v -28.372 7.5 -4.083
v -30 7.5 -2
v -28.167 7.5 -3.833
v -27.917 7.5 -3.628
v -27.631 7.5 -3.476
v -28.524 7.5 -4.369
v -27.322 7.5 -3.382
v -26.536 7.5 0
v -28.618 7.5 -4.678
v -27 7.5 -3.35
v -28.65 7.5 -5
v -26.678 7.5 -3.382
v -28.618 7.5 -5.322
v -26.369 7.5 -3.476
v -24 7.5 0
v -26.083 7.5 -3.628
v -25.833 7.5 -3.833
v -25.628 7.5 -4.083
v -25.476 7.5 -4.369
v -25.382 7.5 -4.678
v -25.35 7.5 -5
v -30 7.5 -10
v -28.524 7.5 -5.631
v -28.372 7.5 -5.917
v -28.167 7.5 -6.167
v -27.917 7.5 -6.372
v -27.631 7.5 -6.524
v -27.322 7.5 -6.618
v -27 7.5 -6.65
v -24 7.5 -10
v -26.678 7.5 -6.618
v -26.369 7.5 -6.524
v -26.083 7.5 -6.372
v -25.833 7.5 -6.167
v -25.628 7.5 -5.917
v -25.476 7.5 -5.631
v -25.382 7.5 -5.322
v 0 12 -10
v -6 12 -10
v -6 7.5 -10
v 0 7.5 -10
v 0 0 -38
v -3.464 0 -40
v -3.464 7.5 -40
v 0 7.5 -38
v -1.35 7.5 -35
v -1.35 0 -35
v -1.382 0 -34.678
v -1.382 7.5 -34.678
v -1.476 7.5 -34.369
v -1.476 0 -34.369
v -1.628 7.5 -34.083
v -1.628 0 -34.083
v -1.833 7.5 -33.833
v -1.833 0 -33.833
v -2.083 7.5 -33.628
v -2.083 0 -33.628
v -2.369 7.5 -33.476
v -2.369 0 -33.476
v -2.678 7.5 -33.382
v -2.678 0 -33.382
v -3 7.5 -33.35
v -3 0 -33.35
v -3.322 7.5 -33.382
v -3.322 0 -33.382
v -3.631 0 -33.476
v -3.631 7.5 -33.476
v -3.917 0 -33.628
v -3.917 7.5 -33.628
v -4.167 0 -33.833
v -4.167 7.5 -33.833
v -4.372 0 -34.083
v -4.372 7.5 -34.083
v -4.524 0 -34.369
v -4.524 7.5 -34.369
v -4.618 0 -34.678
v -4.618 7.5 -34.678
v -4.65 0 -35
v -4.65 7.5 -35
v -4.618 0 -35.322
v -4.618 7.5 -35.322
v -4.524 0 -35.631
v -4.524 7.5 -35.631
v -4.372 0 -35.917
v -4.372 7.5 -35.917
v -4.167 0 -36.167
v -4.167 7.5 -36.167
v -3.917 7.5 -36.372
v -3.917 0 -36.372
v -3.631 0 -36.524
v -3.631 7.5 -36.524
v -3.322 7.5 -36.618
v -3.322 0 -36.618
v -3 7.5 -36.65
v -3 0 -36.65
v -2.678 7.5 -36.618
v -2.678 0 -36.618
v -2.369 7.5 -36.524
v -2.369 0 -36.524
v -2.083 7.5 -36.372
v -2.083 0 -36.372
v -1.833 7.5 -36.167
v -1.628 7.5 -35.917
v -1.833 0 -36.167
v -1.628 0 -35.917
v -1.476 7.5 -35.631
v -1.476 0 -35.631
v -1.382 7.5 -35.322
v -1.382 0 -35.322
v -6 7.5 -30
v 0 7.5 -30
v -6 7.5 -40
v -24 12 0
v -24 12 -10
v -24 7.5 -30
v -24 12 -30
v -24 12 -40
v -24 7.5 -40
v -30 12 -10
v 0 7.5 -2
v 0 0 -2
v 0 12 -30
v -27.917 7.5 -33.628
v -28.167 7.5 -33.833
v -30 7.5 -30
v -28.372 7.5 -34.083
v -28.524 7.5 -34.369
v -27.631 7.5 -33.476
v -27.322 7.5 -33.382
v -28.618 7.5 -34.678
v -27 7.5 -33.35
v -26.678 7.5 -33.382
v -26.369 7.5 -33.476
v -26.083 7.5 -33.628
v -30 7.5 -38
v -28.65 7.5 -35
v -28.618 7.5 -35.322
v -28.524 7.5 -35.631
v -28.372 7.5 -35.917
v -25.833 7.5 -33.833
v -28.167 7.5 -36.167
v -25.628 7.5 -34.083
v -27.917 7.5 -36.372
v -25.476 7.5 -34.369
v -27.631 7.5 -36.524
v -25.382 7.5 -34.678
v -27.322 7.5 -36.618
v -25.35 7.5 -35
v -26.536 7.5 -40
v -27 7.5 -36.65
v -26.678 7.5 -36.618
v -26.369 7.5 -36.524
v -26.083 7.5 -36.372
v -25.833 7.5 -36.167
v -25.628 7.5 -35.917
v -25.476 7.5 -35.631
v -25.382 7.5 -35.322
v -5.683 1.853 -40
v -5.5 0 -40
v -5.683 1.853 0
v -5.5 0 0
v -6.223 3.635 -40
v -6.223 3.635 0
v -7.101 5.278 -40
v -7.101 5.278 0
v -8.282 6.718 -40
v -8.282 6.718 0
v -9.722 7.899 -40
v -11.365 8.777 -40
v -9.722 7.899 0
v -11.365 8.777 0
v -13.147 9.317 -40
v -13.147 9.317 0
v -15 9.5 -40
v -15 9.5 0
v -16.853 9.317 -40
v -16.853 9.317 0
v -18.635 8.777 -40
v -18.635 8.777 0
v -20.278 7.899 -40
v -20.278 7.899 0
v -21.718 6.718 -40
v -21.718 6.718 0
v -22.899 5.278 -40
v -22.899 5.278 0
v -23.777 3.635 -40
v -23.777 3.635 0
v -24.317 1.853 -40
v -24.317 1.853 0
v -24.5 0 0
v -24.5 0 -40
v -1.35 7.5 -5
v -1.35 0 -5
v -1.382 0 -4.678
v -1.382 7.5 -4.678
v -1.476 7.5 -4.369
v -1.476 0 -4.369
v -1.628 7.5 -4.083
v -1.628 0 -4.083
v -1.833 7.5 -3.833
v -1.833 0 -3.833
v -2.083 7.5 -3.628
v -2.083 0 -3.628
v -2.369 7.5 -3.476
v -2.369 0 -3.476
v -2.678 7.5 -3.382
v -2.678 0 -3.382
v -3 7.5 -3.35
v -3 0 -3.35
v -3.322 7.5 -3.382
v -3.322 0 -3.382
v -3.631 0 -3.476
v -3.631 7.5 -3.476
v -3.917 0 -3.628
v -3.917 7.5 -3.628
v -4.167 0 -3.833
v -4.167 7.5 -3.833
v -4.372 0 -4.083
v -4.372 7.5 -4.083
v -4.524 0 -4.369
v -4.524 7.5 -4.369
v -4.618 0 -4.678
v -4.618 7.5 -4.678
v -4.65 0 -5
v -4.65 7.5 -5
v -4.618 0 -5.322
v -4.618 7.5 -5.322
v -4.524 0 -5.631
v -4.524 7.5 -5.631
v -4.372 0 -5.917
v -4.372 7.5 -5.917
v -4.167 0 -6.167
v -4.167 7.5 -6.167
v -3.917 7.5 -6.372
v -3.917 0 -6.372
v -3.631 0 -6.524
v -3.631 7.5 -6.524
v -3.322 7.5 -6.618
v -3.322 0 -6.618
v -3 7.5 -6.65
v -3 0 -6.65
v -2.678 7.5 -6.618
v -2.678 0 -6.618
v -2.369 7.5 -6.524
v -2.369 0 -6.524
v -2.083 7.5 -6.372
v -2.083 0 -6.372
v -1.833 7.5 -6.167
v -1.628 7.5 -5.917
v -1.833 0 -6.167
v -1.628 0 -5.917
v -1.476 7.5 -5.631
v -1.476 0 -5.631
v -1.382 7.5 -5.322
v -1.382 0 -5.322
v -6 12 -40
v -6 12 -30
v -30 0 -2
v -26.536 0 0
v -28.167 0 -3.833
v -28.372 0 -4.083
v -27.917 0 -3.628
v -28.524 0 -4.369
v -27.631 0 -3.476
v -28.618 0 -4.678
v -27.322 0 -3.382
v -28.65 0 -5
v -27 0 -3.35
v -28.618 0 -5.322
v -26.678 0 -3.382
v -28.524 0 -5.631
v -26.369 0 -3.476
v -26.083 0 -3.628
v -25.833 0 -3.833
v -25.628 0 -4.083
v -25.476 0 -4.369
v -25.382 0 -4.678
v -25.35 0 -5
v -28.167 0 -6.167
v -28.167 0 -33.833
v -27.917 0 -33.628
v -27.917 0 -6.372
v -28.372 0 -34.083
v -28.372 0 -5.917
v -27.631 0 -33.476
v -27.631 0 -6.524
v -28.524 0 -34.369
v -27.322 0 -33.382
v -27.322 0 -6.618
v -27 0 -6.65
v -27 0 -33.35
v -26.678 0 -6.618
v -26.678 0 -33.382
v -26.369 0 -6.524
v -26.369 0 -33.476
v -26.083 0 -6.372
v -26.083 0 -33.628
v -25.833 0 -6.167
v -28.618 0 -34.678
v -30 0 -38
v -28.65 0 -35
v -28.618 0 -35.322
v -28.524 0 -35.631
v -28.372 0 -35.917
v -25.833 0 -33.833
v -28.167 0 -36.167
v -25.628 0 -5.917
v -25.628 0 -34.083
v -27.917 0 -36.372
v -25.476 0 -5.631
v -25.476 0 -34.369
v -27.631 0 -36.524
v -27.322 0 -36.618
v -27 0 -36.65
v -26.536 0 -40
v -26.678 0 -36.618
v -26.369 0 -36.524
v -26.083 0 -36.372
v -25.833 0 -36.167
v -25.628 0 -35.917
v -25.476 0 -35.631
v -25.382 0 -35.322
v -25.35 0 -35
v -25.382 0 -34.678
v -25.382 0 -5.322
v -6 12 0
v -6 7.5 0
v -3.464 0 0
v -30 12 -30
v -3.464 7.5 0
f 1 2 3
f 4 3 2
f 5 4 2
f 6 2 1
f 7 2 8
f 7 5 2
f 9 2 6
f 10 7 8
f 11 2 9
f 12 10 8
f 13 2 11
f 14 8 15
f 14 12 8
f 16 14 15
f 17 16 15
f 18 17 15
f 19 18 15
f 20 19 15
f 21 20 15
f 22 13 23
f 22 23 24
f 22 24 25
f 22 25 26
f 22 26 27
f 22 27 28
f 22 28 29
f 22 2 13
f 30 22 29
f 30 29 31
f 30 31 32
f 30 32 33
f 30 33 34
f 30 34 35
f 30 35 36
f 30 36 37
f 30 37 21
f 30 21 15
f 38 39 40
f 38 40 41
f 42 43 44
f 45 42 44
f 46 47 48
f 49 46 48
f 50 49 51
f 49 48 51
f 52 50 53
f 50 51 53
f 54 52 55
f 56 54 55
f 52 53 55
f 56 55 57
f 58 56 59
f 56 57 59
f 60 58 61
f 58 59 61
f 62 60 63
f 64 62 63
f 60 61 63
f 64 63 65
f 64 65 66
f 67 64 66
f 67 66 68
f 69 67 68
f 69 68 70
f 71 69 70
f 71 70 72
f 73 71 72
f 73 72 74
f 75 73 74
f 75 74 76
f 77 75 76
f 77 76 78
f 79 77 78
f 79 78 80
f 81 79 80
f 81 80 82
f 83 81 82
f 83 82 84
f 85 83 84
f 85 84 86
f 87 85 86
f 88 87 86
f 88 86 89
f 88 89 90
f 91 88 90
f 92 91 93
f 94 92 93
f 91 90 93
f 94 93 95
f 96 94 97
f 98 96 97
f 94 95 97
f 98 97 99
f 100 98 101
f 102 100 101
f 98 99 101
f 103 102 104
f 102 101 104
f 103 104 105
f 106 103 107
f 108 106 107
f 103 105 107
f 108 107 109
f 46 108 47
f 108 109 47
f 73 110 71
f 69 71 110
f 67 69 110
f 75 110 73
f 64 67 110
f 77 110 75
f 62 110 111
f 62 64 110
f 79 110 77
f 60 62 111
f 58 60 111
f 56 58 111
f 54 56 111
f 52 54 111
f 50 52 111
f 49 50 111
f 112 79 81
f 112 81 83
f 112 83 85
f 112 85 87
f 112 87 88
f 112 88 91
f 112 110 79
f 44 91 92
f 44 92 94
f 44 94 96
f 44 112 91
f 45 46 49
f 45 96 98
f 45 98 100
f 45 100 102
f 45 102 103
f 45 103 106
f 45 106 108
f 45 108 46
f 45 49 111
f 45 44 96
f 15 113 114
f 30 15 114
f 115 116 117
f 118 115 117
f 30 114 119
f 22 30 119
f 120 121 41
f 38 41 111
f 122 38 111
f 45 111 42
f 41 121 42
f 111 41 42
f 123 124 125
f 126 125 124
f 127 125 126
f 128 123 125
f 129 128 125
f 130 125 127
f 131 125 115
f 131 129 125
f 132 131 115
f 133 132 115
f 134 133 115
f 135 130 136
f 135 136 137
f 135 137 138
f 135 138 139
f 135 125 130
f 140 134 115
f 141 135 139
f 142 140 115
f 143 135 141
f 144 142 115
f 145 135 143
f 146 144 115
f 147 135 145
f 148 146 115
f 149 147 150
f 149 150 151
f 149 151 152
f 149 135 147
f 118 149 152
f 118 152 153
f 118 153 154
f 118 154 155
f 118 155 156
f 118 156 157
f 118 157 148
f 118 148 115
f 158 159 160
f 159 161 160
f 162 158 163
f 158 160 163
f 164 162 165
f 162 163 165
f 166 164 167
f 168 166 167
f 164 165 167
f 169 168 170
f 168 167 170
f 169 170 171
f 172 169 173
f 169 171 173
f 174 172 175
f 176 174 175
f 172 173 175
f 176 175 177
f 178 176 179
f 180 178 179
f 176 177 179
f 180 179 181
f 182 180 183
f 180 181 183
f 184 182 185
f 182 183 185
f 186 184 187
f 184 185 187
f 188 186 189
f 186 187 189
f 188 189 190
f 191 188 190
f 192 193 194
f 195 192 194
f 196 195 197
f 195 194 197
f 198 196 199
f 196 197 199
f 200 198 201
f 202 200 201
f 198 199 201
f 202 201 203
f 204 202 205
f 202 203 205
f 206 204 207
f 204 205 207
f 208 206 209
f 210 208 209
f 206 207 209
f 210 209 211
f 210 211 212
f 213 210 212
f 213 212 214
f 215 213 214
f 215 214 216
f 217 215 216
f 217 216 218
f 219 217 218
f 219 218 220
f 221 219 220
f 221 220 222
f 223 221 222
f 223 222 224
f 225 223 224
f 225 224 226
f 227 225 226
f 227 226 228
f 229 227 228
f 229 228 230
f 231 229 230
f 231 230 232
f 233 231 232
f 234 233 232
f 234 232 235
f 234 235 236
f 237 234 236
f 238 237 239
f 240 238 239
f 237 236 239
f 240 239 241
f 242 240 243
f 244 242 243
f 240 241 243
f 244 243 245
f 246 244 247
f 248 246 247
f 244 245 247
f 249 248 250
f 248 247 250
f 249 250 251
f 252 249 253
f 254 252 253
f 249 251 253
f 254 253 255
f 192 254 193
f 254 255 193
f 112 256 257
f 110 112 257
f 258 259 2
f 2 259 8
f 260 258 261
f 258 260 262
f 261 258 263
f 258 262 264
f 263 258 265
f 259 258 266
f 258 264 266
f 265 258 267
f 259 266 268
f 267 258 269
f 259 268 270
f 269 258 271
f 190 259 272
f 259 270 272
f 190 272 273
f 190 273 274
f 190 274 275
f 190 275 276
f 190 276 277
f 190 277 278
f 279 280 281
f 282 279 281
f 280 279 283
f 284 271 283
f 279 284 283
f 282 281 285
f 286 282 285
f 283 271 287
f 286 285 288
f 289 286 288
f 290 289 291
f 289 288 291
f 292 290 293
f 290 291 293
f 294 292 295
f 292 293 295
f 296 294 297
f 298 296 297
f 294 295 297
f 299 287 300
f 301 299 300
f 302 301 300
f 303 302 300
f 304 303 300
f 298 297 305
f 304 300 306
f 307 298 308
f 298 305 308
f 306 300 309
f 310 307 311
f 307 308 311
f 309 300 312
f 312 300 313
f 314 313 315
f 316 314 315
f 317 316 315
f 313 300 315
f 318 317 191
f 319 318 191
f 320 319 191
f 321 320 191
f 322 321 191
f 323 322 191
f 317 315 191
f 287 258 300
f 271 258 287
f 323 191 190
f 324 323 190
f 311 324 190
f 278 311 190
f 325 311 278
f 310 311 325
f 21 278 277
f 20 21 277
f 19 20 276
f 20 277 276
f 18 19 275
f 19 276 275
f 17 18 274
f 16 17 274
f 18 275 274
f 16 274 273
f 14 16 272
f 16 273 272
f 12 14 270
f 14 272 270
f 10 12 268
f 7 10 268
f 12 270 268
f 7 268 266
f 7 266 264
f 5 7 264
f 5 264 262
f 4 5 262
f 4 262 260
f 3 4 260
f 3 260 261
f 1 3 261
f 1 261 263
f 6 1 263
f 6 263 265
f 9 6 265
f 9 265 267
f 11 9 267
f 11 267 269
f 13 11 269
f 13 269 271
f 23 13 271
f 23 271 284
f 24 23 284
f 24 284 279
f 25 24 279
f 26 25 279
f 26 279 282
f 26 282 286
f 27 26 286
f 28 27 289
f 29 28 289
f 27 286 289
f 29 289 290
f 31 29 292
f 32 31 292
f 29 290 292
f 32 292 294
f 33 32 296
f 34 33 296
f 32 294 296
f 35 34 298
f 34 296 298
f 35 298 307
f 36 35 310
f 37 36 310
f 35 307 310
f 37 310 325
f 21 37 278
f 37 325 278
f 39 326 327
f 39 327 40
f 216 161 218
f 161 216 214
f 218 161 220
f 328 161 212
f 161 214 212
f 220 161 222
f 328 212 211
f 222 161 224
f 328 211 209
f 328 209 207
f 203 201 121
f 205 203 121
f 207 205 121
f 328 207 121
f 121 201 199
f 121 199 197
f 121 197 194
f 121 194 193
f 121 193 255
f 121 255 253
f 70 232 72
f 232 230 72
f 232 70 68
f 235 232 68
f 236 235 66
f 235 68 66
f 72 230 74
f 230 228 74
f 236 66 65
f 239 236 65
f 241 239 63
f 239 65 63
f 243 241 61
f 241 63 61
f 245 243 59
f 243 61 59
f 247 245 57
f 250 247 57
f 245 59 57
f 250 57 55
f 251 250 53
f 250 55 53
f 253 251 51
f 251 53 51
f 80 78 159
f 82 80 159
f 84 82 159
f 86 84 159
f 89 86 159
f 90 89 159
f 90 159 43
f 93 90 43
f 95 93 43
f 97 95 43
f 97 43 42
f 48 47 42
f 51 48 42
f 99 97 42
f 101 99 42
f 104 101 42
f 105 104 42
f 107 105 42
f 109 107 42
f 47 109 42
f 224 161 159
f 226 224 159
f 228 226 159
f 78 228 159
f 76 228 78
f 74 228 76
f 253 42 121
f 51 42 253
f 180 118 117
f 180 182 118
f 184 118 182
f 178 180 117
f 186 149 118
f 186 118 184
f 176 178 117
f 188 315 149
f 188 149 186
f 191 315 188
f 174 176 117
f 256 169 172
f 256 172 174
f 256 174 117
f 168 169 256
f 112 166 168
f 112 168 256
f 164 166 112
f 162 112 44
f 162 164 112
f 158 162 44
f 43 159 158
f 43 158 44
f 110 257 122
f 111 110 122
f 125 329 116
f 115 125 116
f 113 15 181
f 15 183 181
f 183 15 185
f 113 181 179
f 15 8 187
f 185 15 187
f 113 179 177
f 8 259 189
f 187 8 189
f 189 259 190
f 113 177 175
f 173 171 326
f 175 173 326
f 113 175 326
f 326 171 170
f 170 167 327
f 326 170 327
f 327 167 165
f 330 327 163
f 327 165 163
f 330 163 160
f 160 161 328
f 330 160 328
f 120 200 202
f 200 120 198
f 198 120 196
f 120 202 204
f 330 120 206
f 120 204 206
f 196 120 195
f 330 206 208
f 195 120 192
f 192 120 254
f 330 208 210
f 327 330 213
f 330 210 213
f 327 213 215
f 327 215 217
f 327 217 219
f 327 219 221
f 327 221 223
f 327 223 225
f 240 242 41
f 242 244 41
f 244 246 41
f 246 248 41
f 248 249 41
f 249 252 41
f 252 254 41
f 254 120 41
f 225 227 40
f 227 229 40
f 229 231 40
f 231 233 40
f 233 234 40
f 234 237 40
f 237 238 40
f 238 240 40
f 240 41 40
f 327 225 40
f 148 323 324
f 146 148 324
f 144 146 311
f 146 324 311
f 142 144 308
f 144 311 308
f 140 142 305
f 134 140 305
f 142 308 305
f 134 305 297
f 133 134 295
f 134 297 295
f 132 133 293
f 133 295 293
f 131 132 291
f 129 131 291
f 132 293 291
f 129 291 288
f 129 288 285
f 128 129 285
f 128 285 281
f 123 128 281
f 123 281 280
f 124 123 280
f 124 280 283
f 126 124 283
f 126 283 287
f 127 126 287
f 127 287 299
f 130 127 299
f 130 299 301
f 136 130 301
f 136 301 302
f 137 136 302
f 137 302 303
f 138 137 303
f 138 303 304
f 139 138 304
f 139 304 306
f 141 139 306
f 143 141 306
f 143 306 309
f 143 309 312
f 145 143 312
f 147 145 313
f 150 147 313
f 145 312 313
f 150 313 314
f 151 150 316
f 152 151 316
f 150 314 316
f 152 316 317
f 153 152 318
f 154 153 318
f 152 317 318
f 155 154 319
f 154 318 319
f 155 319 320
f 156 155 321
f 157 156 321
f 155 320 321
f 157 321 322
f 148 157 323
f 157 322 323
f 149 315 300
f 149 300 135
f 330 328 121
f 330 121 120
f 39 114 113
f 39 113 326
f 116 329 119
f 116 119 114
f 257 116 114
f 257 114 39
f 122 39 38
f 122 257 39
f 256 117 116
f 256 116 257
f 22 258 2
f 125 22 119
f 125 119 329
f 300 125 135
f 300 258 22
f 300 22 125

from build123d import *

# Parameters (mm, degrees)
ESBO_O1_W                = 30
ESBO_O1_H                = 40
RESSALTO_EXTRUS_O1_DEPTH = 12
ESBO_O16_W               = 9.5
ESBO_O16_H               = 40
ESBO_O17_R               = 1.65
CORTE_EXTRUS_O12_DEPTH   = 13
CHANFRO1_SIZE            = 2
CHANFRO1_SIZE2           = 3.464101615
CHANFRO1_PART_2_SIZE     = 2
CHANFRO1_PART_2_SIZE2    = 3.464101615
CORTE_EXTRUS_O13_DEPTH   = 4.5


with BuildPart() as part:
    # Esboço1 → Ressalto-extrusão1 (new body)
    with BuildSketch(Plane(origin=(0, 0, 0), x_dir=(1, 0, 0), z_dir=(0, 1, 0))):
        with Locations((-15, 20)):
            Rectangle(ESBO_O1_W, ESBO_O1_H)
    extrude(amount=RESSALTO_EXTRUS_O1_DEPTH)

    # Esboço16 → Corte-Revolução1 (revolve, cut)
    with BuildSketch(Plane.XZ):
        with Locations((-19.75, -20)):
            Rectangle(ESBO_O16_W, ESBO_O16_H)
    revolve(axis=Axis((-15, 0, -40), (0, 0, 1)), mode=Mode.SUBTRACT)

    # Esboço17 → Corte-extrusão12 (cut, through all)
    with BuildSketch(Plane.XZ):
        with Locations((-27, -35)):
            Circle(ESBO_O17_R)
        with Locations((-27, -5)):
            Circle(ESBO_O17_R)
        with Locations((-3, -35)):
            Circle(ESBO_O17_R)
        with Locations((-3, -5)):
            Circle(ESBO_O17_R)
    extrude(amount=-CORTE_EXTRUS_O12_DEPTH, mode=Mode.SUBTRACT)

    # Chanfro1
    chanfro1_edges = [part.edges().sort_by_distance(p)[0] for p in [
        (0, 6, 0),
        (0, 6, -40),
    ]]
    chanfro1_side = [part.faces().sort_by_distance(p)[0] for p in [
        (0, 6, -20),
    ]]
    chamfer(chanfro1_edges, length=CHANFRO1_SIZE, length2=CHANFRO1_SIZE2, reference=chanfro1_side[0])

    # Chanfro1 part 2
    chanfro1_part_2_edges = [part.edges().sort_by_distance(p)[0] for p in [
        (-30, 6, 0),
        (-30, 6, -40),
    ]]
    chanfro1_part_2_side = [part.faces().sort_by_distance(p)[0] for p in [
        (-30, 6, -20),
    ]]
    chamfer(chanfro1_part_2_edges, length=CHANFRO1_PART_2_SIZE, length2=CHANFRO1_PART_2_SIZE2, reference=chanfro1_part_2_side[0])

    # Esboço18 → Corte-extrusão13 (cut)
    with BuildSketch(Plane(origin=(0, 12, 0), x_dir=(1, 0, 0), z_dir=(0, 1, 0))):
        Polygon((-6, 40), (-6, 30), (0, 30), (0, 38), (-3.464101615, 40), align=None)
        Polygon((-24, 40), (-26.535898385, 40), (-30, 38), (-30, 30), (-24, 30), align=None)
        Polygon((0, 10), (0, 2), (-3.464101615, 0), (-6, 0), (-6, 10), align=None)
        Polygon((-24, 0), (-24, 10), (-30, 10), (-30, 2), (-26.535898385, 0), align=None)
    extrude(amount=-CORTE_EXTRUS_O13_DEPTH, mode=Mode.SUBTRACT)


solid = part.part
